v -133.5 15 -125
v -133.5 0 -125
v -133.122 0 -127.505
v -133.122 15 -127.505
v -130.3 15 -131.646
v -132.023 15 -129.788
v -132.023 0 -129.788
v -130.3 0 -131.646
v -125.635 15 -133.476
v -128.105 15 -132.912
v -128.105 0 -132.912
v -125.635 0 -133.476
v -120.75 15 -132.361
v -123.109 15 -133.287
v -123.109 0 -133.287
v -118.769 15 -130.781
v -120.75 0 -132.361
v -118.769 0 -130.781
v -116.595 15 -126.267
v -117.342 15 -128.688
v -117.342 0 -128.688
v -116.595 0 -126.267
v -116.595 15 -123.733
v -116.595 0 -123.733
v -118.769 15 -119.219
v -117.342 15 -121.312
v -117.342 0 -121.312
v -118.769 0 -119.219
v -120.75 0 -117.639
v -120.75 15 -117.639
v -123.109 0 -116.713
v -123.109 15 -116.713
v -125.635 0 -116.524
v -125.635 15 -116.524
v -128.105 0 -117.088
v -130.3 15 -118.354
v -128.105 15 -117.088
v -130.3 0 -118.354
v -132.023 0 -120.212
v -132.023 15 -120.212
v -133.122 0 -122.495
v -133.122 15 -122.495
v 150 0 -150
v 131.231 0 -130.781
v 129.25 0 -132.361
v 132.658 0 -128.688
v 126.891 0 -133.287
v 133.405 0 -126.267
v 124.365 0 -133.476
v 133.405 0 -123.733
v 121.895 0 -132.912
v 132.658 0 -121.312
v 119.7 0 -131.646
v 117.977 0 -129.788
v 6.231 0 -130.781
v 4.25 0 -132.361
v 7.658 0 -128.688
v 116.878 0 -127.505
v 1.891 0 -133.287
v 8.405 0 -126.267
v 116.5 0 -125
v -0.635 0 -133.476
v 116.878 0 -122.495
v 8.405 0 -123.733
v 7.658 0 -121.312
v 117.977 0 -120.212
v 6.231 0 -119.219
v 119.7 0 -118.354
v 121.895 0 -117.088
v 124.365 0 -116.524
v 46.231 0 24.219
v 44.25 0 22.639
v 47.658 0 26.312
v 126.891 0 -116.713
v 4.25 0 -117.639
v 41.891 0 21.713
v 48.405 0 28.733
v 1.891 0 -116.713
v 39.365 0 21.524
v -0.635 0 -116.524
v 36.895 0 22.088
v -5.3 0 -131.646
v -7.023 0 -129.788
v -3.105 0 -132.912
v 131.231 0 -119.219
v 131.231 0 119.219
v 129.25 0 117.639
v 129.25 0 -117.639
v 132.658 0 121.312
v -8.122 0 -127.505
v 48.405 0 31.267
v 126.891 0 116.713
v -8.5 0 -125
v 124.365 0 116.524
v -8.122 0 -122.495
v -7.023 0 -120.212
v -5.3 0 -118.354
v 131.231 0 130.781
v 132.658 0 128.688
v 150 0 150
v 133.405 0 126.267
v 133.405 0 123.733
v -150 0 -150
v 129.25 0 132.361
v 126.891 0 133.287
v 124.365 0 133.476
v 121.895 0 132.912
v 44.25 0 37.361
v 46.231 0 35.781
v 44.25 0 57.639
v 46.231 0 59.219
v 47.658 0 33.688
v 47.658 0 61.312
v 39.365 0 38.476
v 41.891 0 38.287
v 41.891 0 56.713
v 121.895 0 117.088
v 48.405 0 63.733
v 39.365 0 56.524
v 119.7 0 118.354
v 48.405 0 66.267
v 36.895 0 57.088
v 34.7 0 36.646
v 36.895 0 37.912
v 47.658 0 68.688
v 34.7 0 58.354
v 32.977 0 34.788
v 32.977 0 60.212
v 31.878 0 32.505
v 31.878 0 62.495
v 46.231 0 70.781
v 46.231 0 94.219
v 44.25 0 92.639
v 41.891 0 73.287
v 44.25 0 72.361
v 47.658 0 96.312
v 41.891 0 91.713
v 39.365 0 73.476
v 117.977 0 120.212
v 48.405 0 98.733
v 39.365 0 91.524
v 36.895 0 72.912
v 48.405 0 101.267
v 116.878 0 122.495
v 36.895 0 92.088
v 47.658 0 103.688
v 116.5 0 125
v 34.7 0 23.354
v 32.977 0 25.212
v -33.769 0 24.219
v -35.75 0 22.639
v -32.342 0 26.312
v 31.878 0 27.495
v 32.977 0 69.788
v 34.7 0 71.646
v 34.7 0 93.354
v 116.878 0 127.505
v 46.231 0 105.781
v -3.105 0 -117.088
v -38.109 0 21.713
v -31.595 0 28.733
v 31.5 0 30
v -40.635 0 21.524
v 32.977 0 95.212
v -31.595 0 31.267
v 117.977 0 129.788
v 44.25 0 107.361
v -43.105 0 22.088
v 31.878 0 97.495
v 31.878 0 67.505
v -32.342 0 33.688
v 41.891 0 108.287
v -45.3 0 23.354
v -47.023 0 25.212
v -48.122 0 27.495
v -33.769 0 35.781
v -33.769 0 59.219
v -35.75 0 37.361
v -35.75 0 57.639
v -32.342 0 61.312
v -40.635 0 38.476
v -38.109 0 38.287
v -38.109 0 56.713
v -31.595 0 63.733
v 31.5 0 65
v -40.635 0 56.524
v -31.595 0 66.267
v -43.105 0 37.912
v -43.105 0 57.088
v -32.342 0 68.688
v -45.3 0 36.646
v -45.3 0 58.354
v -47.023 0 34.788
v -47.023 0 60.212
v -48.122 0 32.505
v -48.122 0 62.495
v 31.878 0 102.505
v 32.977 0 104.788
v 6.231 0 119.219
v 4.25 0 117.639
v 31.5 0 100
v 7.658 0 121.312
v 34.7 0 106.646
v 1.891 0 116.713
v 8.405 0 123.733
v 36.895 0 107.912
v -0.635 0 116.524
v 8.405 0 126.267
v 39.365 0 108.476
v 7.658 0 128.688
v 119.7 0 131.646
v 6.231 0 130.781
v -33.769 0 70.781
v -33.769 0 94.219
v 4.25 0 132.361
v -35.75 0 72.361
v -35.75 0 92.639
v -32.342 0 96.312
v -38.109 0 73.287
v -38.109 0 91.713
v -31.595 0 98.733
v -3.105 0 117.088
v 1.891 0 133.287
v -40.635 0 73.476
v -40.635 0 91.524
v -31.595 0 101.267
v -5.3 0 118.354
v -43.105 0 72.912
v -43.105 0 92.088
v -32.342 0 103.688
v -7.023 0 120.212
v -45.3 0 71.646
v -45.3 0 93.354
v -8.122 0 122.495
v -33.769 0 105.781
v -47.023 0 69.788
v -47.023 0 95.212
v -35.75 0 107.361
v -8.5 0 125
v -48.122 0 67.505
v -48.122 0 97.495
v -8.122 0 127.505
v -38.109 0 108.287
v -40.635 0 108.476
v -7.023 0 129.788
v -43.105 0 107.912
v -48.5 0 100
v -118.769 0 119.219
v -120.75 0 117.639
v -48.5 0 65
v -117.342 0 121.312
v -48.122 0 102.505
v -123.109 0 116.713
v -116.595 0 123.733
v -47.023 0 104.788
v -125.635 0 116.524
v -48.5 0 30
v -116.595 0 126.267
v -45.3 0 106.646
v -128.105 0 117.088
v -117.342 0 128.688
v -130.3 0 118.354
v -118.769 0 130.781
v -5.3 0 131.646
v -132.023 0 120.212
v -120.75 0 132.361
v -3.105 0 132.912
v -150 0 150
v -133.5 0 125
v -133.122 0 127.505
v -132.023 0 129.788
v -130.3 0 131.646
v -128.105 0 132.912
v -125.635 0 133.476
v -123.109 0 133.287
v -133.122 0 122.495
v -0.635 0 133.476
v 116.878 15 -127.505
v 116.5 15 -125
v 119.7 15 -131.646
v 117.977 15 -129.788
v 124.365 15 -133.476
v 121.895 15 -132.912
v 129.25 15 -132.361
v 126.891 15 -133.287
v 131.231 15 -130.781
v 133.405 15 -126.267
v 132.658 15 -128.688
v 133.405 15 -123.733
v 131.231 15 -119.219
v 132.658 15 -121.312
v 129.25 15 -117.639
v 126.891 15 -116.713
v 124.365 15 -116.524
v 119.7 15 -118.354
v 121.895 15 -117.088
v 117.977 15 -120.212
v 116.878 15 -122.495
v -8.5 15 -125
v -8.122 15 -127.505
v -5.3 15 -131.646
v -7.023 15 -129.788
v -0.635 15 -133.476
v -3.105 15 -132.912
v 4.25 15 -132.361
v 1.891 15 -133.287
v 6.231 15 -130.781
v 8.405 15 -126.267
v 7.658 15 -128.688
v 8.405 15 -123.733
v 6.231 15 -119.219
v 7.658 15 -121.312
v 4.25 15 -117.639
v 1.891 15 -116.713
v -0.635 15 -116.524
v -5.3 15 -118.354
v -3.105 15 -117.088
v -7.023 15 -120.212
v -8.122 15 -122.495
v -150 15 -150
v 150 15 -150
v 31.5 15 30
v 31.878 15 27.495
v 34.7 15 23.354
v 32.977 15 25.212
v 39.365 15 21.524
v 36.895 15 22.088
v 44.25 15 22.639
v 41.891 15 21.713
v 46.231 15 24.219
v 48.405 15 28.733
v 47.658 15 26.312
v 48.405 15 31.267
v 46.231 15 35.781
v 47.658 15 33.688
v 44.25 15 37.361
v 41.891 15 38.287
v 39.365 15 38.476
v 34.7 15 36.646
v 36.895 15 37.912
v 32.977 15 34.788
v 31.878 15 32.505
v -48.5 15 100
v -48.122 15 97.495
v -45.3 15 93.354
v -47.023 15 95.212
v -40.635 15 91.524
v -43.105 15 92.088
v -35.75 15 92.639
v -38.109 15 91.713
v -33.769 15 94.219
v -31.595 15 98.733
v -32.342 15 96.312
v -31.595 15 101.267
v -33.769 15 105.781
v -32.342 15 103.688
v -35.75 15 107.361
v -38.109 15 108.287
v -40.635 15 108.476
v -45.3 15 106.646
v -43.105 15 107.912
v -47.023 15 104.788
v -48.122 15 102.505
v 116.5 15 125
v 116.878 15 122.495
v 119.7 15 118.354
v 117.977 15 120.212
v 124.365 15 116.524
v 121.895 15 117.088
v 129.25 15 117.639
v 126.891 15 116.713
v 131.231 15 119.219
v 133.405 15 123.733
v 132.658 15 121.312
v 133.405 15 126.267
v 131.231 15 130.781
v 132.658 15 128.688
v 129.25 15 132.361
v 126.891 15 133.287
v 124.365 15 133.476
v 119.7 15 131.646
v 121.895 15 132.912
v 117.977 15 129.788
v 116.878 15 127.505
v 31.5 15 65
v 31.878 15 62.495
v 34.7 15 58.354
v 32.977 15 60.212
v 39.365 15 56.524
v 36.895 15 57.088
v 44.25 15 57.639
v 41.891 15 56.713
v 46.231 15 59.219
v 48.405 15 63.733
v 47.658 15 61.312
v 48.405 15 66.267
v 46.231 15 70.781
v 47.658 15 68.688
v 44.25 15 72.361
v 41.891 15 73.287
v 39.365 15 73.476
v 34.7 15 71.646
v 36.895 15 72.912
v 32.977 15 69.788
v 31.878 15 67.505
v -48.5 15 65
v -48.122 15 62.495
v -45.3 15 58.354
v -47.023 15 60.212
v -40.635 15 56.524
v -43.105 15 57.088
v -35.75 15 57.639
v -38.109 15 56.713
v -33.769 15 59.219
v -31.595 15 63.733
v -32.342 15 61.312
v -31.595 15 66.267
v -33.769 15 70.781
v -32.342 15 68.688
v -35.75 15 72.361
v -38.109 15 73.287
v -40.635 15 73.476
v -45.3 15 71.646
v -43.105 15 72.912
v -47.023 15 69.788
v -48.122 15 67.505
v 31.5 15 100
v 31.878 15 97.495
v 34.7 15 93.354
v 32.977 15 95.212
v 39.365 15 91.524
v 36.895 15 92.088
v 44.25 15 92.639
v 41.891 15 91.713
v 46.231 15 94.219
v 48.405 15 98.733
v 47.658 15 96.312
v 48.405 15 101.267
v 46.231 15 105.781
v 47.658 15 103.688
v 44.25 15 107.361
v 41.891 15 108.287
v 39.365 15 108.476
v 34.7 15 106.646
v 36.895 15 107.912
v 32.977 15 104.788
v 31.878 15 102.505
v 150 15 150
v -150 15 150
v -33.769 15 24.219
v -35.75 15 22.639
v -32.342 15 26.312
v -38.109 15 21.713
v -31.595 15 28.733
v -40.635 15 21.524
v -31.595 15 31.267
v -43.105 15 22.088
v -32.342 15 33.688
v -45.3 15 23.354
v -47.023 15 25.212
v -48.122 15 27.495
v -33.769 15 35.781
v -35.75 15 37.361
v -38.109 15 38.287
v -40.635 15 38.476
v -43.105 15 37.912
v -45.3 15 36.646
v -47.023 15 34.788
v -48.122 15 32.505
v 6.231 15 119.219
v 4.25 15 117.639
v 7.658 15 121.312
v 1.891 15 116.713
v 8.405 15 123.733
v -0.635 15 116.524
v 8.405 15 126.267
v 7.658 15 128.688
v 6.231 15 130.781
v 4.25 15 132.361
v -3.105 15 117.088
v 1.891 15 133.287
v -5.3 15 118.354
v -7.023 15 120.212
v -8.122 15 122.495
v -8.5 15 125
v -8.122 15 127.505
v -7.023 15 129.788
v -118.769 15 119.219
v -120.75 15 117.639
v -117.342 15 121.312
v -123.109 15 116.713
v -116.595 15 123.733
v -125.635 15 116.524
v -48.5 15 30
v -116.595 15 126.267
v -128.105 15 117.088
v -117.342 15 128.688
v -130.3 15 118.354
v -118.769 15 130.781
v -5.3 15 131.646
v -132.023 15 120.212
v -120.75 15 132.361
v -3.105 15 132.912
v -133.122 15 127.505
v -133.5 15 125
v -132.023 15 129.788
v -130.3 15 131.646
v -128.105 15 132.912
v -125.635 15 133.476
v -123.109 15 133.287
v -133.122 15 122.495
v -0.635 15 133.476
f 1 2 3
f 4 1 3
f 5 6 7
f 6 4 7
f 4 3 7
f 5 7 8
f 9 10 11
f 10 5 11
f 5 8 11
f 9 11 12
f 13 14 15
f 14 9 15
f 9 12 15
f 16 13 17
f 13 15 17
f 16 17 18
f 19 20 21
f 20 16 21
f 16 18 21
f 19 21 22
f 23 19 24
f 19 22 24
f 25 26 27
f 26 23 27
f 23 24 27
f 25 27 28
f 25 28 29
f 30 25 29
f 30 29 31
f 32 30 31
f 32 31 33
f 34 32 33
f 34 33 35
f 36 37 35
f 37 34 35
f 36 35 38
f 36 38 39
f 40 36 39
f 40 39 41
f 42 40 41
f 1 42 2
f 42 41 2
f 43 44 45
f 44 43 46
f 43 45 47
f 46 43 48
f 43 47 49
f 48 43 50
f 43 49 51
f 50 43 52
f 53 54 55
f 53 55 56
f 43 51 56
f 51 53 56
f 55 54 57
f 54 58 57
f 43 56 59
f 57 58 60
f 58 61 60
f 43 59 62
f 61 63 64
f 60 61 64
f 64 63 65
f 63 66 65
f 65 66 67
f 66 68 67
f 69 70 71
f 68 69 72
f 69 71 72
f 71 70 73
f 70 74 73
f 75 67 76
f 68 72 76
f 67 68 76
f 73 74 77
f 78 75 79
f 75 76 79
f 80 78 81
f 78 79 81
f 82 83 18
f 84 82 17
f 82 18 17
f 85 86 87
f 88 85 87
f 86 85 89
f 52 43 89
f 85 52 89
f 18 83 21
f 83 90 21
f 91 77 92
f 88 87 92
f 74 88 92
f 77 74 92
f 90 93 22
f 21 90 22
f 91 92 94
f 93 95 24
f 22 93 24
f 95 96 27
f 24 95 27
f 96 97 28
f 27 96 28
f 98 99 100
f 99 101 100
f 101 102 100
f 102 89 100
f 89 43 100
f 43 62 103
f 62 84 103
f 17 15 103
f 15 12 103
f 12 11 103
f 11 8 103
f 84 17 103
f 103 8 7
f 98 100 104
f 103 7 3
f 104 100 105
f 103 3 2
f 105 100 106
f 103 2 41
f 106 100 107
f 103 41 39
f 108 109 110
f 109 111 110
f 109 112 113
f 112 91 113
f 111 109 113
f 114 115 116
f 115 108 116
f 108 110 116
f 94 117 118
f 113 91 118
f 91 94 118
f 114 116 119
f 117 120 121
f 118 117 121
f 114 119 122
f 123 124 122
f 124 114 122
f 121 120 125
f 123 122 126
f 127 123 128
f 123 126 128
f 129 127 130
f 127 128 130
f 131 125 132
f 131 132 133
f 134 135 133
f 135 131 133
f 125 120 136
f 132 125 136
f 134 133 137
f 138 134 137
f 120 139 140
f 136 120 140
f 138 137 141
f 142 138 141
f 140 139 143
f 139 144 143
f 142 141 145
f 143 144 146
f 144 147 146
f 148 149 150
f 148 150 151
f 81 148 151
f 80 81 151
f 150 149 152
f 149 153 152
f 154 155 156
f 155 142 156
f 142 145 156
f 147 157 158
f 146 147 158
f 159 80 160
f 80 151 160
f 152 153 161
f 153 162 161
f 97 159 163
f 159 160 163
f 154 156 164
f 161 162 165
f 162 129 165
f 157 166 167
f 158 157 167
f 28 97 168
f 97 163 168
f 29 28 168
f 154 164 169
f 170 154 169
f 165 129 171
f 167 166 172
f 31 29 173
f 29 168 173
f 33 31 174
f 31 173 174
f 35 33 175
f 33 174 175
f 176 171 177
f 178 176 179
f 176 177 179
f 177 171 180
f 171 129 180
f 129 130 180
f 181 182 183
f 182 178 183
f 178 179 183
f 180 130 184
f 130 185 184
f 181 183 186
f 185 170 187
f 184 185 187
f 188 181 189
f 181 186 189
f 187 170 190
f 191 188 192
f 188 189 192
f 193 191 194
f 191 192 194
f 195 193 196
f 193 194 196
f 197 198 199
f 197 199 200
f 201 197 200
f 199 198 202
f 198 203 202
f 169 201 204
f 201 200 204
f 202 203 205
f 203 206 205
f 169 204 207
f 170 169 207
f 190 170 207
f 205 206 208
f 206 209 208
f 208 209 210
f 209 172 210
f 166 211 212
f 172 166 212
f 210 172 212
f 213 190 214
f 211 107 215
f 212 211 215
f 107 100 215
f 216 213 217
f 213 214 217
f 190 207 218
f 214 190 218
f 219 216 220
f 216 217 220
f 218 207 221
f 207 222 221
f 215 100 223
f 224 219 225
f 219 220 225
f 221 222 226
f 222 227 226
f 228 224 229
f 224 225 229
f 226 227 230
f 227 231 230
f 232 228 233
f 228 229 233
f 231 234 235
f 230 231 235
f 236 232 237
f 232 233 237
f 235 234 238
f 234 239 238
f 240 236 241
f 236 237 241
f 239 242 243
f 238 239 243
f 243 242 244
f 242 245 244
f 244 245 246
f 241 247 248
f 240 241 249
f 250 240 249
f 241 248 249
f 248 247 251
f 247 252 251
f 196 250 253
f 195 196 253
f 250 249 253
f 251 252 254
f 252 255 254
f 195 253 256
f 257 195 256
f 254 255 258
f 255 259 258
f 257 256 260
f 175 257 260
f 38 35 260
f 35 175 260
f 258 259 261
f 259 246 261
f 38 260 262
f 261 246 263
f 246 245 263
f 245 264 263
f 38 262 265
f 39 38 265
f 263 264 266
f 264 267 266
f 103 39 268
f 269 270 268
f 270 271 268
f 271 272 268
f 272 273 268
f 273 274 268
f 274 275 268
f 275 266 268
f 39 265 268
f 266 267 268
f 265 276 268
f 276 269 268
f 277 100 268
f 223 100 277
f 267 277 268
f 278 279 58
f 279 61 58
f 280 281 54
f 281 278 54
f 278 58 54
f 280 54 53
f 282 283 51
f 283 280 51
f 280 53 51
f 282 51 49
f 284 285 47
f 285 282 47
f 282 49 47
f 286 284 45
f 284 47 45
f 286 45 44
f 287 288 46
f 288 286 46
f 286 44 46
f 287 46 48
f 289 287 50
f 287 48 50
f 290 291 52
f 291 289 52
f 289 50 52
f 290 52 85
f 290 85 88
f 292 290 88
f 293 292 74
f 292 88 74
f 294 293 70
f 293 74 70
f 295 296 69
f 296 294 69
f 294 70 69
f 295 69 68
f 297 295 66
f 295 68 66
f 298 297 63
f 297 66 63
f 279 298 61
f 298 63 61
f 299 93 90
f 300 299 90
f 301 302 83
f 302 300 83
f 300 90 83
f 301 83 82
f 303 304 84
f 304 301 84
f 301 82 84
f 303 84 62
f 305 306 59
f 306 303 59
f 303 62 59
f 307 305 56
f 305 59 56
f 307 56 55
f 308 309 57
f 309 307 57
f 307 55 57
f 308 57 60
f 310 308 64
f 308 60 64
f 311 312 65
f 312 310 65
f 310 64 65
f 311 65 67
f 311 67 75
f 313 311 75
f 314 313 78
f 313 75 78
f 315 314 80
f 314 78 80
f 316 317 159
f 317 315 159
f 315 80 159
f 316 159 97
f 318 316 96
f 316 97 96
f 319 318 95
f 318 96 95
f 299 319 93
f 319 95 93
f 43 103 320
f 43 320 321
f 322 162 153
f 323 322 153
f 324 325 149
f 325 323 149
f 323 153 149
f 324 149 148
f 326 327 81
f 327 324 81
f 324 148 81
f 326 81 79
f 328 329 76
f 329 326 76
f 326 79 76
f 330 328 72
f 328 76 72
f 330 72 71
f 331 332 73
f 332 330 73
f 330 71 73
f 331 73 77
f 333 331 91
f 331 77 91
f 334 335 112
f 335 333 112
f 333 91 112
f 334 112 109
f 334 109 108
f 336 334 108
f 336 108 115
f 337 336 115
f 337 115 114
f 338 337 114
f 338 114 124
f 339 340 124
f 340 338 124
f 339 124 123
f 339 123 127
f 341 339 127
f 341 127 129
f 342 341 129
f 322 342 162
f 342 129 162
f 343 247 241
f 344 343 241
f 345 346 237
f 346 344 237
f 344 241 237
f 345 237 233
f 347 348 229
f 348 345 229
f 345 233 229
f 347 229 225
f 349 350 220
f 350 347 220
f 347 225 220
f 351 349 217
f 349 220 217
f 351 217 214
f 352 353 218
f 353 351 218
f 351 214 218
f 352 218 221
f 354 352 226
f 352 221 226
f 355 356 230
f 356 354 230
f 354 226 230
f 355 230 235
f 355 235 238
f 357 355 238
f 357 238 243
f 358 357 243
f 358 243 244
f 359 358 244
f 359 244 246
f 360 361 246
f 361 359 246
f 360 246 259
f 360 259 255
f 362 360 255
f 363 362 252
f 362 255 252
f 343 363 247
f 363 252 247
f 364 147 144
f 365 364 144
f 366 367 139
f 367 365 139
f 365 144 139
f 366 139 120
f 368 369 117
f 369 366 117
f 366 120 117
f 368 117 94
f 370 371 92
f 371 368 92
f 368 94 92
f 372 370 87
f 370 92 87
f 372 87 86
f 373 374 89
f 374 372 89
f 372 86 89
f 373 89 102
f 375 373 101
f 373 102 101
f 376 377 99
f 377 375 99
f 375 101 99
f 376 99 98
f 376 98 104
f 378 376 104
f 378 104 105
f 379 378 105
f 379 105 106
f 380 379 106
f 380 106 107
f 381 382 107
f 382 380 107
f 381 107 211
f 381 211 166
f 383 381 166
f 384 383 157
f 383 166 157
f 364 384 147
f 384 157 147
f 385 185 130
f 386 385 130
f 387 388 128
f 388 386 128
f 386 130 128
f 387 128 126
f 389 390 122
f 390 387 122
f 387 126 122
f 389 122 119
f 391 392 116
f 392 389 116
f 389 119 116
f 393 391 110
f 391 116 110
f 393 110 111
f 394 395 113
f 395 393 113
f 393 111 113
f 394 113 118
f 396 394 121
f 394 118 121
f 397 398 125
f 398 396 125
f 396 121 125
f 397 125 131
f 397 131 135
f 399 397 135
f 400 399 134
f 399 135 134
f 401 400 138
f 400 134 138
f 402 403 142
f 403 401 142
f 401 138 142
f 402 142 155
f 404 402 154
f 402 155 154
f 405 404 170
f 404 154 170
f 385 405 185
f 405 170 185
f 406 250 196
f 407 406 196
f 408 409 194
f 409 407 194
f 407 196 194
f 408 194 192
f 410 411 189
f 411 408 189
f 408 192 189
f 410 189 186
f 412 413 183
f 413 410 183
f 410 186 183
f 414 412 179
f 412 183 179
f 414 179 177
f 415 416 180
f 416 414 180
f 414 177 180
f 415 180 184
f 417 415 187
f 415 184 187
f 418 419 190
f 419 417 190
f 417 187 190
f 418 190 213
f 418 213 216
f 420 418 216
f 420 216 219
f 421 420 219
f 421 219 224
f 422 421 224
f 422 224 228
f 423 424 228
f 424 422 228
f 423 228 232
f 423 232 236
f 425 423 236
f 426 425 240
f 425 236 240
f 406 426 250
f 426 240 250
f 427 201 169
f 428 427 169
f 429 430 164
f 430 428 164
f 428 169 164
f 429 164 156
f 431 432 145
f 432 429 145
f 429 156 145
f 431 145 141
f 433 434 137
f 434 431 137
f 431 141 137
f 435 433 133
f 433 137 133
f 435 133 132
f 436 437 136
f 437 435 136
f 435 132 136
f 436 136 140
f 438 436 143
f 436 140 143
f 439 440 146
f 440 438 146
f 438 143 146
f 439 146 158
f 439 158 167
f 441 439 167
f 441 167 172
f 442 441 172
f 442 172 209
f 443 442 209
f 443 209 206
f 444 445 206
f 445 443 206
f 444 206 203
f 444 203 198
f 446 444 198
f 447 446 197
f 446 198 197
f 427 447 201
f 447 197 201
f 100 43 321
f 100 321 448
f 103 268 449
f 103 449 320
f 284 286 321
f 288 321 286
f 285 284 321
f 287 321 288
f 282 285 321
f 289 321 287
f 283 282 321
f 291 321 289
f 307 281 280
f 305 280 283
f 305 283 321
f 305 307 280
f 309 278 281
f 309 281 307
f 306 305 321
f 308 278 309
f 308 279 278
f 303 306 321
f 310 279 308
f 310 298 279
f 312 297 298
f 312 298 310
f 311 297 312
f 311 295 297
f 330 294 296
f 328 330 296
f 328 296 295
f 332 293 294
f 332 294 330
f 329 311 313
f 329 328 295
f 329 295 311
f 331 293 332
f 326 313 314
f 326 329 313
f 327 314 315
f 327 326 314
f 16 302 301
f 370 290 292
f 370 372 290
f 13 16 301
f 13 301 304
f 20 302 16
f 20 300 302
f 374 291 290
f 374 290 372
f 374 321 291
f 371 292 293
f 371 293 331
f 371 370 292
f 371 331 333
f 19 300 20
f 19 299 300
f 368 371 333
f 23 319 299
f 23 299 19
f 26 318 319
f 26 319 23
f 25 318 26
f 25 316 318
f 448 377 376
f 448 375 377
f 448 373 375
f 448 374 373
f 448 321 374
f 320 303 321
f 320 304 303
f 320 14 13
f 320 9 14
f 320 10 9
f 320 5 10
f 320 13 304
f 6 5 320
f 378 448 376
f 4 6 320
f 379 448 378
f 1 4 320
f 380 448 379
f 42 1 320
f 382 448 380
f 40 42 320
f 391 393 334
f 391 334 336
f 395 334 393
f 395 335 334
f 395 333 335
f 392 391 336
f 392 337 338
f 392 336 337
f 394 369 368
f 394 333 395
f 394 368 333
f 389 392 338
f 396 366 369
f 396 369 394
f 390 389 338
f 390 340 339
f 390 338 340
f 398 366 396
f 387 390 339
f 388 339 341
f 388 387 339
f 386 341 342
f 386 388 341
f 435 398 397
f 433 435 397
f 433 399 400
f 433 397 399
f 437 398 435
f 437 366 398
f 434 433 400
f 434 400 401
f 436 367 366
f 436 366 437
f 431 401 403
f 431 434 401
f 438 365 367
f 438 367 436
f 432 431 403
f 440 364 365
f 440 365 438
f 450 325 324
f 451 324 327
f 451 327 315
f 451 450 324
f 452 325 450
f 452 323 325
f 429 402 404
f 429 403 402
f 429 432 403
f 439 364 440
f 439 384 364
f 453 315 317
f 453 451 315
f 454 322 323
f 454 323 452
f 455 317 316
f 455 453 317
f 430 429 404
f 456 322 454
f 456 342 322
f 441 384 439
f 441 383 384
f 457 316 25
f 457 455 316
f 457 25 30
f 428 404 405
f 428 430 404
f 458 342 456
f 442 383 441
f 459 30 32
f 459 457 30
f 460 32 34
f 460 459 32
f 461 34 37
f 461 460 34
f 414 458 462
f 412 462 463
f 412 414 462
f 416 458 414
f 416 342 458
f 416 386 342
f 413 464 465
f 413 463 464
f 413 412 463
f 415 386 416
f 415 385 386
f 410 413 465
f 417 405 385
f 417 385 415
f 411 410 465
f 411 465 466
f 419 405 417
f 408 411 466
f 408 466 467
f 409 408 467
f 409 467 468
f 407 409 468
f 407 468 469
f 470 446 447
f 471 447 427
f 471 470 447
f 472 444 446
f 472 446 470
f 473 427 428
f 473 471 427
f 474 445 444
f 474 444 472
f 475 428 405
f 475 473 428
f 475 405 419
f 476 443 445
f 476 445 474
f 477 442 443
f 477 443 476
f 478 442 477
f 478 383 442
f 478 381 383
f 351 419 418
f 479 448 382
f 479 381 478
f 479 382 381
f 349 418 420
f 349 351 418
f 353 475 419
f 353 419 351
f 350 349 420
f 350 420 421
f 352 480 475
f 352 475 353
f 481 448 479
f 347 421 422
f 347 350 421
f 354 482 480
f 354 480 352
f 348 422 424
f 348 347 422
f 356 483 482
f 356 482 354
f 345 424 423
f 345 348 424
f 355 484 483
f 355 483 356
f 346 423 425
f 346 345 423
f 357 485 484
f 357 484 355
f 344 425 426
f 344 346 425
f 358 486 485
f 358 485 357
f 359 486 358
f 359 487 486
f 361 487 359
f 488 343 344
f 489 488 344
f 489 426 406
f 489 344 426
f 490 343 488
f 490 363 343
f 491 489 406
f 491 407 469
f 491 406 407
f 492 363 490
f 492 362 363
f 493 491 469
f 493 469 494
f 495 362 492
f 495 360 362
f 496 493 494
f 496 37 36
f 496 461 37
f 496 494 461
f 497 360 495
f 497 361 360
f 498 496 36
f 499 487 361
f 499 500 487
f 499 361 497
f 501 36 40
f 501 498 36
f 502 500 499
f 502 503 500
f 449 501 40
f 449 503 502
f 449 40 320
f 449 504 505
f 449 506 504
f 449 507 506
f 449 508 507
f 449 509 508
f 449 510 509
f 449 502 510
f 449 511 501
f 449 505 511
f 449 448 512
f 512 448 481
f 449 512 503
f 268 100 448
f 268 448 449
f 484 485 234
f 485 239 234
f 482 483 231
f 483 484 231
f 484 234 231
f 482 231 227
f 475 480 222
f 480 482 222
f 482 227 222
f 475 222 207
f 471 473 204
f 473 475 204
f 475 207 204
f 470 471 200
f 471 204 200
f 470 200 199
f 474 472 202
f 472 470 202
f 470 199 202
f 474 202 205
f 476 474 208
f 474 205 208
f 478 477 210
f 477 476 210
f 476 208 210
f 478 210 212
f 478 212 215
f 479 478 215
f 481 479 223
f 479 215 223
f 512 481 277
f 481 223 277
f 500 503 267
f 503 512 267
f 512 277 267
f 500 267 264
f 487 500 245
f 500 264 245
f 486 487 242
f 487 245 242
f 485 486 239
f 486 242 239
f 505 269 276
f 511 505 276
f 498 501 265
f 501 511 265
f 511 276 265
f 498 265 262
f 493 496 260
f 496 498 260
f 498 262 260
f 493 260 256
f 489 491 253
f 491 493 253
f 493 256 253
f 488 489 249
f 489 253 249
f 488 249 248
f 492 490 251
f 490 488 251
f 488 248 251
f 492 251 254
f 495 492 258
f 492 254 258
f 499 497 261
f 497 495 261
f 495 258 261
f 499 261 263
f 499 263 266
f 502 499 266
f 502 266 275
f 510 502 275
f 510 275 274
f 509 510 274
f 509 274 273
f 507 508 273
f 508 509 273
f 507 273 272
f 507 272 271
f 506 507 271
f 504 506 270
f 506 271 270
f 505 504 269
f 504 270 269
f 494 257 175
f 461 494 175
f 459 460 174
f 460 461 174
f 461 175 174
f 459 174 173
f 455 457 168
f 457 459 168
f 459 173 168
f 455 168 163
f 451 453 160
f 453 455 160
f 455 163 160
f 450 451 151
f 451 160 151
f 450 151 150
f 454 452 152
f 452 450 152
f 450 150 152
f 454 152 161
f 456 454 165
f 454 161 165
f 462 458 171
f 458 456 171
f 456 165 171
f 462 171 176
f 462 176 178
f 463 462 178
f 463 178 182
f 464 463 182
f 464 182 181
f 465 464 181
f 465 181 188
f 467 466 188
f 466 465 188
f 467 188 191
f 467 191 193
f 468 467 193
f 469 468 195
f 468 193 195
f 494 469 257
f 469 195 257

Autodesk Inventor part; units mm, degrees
ref_plane "YZ Plane" through (0, 0, 0) normal (1, 0, 0) x (0, 1, 0)
ref_plane "XZ Plane" through (0, 0, 0) normal (0, 1, 0) x (-1, 0, 0)
ref_plane "XY Plane" through (0, 0, 0) normal (0, 0, 1) x (1, 0, 0)
sketch "Эскиз1" plane through (0, 0, 0) normal (0, 1, 0) x (-1, 0, 0)
  line L0 (-150, 150) -> (150, 150)
  line L1 (150, 150) -> (150, -150)
  line L2 (150, -150) -> (-150, -150)
  line L3 (-150, -150) -> (-150, 150)
  line L4 (-150, 150) -> (150, -150) construction
  line L5 (150, 150) -> (-150, -150) construction
  circle A0 centre (125, -125) radius 8.5
  circle A1 centre (0, -125) radius 8.5
  circle A2 centre (-125, -125) radius 8.5
  circle A3 centre (125, 125) radius 8.5
  circle A4 centre (0, 125) radius 8.5
  circle A5 centre (40, 100) radius 8.5
  circle A6 centre (40, 65) radius 8.5
  circle A7 centre (40, 30) radius 8.5
  circle A8 centre (-40, 30) radius 8.5
  circle A9 centre (-40, 65) radius 8.5
  circle A10 centre (-40, 100) radius 8.5
  circle A11 centre (-125, -125) radius 8.5
  circle A12 centre (-125, 125) radius 8.5
  point P0 (0, 0)
  point P1 (0, 0)
  point P2 (0, 0)
  dimension "d0" = 300
  dimension "d1" = 300
  dimension "d2" = 17
  dimension "d3" = 50
  dimension "d4" = 85
  dimension "d5" = 120
  dimension "d6" = 80
  dimension "d7" = 40
  dimension "d8" = 25
  dimension "d9" = 25
  dimension "d10" = 25
  dimension "d11" = 25
extrude "Пластина1" add sketch "Эскиз1" along normal blind 15
equation "\"d12\" = Толщина"
equation "\"Радиус_гибки\" = Толщина"
equation "\"Ширина_просечки\" = Толщина"
equation "\"Глубина_просечки\" = 0.5 * Толщина"
equation "\"Радиус_перехода\" = Радиус_гибки"
equation "\"Радиус_Якоби\" = Радиус_гибки"
equation "\"Размер_зазора\" = Толщина"
equation "\"Толщина\" = 15"
properties part number "Lift.00.00.00.01"
